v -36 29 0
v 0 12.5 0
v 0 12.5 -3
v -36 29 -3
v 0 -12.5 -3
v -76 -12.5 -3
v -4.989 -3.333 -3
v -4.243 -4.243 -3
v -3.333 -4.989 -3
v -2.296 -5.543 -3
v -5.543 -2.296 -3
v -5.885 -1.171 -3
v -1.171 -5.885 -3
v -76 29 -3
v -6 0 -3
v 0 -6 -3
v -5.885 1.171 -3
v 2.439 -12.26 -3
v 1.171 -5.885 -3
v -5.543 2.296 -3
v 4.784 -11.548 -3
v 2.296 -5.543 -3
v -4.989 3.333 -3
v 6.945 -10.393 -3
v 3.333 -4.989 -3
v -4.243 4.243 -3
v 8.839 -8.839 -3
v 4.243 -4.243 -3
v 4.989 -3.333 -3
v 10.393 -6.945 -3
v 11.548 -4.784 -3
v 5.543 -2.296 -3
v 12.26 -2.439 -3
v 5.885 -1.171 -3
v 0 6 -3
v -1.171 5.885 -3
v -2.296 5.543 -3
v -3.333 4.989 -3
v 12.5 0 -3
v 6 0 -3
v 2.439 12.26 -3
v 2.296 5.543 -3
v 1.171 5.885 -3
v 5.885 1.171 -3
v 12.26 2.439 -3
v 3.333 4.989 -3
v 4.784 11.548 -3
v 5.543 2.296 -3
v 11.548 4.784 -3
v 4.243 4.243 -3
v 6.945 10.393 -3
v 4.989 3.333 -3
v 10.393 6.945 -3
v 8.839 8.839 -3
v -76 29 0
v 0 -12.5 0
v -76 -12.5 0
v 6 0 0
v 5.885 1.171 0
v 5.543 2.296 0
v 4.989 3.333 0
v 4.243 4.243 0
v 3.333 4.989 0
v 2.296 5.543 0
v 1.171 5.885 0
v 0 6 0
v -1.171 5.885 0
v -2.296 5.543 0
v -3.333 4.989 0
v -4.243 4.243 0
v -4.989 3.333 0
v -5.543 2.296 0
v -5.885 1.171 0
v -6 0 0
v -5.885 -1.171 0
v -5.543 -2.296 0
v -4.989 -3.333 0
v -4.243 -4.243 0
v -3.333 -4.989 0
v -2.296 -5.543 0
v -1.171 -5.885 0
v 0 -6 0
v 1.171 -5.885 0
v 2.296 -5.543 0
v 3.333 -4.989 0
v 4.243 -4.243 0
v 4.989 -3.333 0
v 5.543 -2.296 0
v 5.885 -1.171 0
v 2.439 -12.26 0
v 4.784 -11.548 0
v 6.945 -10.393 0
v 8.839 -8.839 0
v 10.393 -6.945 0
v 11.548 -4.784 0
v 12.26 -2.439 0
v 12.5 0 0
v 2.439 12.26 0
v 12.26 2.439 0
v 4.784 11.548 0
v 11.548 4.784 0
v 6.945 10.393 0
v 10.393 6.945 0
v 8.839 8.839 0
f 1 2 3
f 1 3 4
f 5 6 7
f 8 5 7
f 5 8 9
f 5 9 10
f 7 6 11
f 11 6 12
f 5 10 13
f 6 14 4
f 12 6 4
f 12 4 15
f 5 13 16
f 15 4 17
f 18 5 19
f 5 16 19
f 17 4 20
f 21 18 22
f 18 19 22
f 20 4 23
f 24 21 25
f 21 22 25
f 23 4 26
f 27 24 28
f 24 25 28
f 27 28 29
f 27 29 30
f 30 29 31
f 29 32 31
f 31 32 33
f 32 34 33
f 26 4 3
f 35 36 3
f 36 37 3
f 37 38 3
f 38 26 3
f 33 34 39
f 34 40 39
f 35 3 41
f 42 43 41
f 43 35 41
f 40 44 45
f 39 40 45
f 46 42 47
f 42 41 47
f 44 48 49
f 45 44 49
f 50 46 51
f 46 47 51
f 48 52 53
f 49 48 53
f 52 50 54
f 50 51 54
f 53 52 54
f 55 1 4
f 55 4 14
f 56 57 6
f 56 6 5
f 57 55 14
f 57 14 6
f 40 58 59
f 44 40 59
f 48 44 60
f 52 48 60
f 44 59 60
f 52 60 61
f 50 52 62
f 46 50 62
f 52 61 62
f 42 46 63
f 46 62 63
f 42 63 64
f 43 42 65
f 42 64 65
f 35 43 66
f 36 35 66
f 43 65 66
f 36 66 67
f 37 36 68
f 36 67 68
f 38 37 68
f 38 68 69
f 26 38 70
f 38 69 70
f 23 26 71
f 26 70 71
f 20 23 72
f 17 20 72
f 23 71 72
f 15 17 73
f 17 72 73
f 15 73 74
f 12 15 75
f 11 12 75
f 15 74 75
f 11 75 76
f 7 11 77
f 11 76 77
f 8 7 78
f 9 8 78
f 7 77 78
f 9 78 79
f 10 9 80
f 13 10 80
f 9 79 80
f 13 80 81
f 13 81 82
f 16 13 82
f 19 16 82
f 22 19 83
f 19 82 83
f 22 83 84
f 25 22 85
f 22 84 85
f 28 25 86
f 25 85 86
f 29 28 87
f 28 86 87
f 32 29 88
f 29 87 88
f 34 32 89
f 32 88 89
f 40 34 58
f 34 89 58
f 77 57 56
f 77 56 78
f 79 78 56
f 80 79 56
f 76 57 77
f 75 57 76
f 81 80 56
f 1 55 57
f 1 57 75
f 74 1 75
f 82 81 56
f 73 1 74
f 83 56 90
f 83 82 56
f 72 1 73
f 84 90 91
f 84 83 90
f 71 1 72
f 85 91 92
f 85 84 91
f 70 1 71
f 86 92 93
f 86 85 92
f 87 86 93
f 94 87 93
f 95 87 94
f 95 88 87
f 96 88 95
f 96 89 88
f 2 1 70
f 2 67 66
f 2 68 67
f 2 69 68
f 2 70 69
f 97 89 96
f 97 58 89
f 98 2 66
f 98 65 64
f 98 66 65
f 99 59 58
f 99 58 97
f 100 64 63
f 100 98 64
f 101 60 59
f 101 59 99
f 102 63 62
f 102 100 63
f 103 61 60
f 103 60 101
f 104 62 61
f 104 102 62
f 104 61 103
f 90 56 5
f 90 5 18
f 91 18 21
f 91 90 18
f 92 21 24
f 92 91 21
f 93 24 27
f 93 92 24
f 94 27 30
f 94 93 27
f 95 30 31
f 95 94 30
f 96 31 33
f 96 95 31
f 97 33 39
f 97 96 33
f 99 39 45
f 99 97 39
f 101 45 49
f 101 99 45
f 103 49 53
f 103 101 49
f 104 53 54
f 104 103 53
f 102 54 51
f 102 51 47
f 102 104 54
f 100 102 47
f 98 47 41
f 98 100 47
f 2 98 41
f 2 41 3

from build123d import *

# Parameters (mm, degrees)
F0_R     = 6
F1_DEPTH = 3


# Not quite as in the source:
# - a feature names something its author has since deleted; it is built from what else it names


with BuildPart() as f1:
    # F0 (on Top) → F1 (new body)
    with BuildSketch(Plane.XY):
        with BuildLine():
            Line((-36, 29), (-76, 29))
            Line((-76, 29), (-76, -12.5))
            Line((-76, -12.5), (0, -12.5))
            ThreePointArc((0, -12.5), (12.5, 0), (0, 12.5))
            Line((0, 12.5), (-36, 29))
        make_face()
        Circle(F0_R, mode=Mode.SUBTRACT)
    extrude(amount=-F1_DEPTH)


solid = f1.part
